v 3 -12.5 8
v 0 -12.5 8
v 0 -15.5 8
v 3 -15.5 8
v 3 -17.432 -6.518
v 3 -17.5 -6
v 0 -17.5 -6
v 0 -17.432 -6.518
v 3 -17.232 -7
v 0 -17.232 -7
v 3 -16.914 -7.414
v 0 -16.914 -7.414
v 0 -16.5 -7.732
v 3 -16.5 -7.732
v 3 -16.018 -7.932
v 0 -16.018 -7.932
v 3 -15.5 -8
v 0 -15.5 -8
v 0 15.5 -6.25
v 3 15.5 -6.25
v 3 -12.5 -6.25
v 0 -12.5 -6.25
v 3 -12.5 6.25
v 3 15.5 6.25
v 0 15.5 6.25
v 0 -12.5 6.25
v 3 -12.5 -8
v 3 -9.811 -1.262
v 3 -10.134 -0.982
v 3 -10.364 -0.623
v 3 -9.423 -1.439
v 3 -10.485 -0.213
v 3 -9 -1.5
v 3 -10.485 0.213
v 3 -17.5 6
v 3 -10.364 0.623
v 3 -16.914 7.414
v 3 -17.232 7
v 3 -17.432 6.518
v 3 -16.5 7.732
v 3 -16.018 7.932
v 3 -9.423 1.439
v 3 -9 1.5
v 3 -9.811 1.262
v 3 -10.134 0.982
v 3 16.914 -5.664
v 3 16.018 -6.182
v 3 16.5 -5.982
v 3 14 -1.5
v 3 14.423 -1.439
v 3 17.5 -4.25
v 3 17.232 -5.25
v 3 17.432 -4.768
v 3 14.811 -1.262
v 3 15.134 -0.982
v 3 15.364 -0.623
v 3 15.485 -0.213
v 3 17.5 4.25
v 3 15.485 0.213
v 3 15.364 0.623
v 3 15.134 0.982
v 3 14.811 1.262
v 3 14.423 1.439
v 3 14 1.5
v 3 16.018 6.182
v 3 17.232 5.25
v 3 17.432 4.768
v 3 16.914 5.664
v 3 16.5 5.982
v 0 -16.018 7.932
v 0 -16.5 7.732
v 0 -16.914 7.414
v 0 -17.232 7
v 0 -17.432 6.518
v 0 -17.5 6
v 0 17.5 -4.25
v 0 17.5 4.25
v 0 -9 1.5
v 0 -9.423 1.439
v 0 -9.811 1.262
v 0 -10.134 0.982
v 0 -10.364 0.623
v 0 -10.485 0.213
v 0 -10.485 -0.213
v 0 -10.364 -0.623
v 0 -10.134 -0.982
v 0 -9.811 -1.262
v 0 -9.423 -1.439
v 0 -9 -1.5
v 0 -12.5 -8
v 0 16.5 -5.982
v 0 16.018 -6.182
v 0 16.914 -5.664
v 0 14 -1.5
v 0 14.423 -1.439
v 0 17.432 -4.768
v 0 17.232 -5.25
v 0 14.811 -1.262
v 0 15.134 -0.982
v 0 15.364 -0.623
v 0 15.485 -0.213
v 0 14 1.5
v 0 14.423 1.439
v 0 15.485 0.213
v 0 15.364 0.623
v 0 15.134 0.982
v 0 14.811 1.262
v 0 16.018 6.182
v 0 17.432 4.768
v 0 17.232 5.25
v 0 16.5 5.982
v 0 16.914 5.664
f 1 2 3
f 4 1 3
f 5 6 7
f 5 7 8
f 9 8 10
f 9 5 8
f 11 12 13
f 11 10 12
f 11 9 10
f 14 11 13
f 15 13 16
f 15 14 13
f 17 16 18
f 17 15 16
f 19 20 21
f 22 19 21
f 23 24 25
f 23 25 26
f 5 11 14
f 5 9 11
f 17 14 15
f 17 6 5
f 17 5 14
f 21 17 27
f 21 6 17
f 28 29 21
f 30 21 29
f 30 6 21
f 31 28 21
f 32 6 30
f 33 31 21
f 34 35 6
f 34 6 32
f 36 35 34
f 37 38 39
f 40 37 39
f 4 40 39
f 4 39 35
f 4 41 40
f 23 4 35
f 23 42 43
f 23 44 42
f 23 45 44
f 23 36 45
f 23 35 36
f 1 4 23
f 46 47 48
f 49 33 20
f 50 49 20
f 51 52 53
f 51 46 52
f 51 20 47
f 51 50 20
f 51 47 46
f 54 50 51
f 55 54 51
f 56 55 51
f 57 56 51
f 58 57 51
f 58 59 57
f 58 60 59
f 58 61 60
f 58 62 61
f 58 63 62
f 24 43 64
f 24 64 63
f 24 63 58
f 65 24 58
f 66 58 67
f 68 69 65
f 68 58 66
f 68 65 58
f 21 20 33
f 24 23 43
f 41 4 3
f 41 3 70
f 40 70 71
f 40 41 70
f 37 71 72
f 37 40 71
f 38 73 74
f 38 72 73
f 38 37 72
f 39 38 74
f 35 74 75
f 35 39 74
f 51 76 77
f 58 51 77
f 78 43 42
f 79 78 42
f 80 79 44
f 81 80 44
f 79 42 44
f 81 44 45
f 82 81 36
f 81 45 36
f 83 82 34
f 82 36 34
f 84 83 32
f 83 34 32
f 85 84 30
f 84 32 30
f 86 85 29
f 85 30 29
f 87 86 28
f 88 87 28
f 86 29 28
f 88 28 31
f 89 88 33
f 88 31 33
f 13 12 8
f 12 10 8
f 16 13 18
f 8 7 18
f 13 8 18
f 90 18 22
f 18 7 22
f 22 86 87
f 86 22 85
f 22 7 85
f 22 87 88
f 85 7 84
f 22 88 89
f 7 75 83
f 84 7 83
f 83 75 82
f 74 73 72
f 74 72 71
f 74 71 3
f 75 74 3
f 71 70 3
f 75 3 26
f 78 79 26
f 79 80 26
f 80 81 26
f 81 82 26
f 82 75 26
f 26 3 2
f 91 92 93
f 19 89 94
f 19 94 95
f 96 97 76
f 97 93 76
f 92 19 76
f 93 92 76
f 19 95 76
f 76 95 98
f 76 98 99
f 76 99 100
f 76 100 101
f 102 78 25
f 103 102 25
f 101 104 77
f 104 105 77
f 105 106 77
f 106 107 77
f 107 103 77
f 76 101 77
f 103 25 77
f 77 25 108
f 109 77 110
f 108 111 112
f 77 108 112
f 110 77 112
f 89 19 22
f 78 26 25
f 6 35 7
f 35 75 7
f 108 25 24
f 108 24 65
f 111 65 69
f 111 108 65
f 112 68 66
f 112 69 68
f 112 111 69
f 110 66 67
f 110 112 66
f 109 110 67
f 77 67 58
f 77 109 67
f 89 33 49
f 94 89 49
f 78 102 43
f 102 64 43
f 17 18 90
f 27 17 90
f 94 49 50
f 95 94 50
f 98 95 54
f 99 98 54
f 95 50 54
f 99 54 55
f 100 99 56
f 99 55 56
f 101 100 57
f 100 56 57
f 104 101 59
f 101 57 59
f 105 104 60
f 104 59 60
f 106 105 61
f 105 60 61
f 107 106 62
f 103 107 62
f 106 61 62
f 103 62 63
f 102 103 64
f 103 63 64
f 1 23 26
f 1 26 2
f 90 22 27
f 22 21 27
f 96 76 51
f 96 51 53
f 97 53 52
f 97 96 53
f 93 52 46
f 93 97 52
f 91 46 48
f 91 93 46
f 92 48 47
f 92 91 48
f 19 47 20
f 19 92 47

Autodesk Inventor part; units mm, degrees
ref_plane "YZ Plane" through (0, 0, 0) normal (1, 0, 0) x (0, 1, 0)
ref_plane "XZ Plane" through (0, 0, 0) normal (0, 1, 0) x (-1, 0, 0)
ref_plane "XY Plane" through (0, 0, 0) normal (0, 0, 1) x (1, 0, 0)
sketch "Sketch1" plane through (0, 0, 0) normal (1, 0, 0) x (0, 1, 0)
  line L0 (17.5, 8) -> (-17.5, 8)
  line L1 (-17.5, 8) -> (-17.5, -8)
  line L2 (-17.5, -8) -> (17.5, -8)
  line L3 (17.5, -8) -> (17.5, 8)
  line L4 (17.5, 8) -> (-17.5, -8) construction
  line L5 (-17.5, 8) -> (17.5, -8) construction
  point P0 (0, 0)
  dimension "d0" = 35
  dimension "d1" = 16
extrude "Extrusion1" add sketch "Sketch1" along normal blind 3
sketch "Sketch2" plane through (3, 0, 0) normal (1, 0, 0) x (0, 0, -1)
  line L0 (-8, 17.5) -> (-8, -17.5) construction
  line L1 (-8, -12.5) -> (7.9898, -12.5) construction
  line L2 (-8, -17.5) -> (8, -17.5) construction
  line L3 (8, 17.5) -> (-8, 17.5) construction
  line L4 (-8, 17.5) -> (7.9898, -12.5) construction
  line L5 (8, -17.5) -> (8, 17.5) construction
  line L6 (8, 17.5) -> (-8, -12.5) construction
  line L7 (0, 14) -> (0, -9) construction
  line L8 (-1.5, 14) -> (-1.5, -9)
  line L9 (1.5, -9) -> (1.5, 14)
  arc A0 (1.5, 14) -> (-1.5, 14) centre (0, 14) ccw
  arc A1 (-1.5, -9) -> (1.5, -9) centre (0, -9) ccw
  line L10 (6.25, -12.5) -> (8, -12.5)
  line L11 (8, -12.5) -> (8, 17.5)
  line L12 (8, 17.5) -> (6.25, 17.5)
  line L13 (6.25, 17.5) -> (6.25, -12.5)
  line L14 (-6.25, -12.5) -> (-8, -12.5)
  line L15 (-8, -12.5) -> (-8, 17.5)
  line L16 (-8, 17.5) -> (-6.25, 17.5)
  line L17 (-6.25, 17.5) -> (-6.25, -12.5)
  point P0 (0, 0)
  point P1 (0, 2.5)
  point P2 (-7.9898, -12.5)
  dimension "d4" = 5
  dimension "d5" = 3
  dimension "d6" = 23
  dimension "d9" = 6.25
extrude "Extrusion2" cut sketch "Sketch2" against normal through all
fillet "Fillet1" radius 2 4 edges at (1.5, 17.5, 6.25) (1.5, 17.5, -6.25) (1.5, -17.5, 8) (1.5, -17.5, -8)
properties part number "Ga mica 5mm"
